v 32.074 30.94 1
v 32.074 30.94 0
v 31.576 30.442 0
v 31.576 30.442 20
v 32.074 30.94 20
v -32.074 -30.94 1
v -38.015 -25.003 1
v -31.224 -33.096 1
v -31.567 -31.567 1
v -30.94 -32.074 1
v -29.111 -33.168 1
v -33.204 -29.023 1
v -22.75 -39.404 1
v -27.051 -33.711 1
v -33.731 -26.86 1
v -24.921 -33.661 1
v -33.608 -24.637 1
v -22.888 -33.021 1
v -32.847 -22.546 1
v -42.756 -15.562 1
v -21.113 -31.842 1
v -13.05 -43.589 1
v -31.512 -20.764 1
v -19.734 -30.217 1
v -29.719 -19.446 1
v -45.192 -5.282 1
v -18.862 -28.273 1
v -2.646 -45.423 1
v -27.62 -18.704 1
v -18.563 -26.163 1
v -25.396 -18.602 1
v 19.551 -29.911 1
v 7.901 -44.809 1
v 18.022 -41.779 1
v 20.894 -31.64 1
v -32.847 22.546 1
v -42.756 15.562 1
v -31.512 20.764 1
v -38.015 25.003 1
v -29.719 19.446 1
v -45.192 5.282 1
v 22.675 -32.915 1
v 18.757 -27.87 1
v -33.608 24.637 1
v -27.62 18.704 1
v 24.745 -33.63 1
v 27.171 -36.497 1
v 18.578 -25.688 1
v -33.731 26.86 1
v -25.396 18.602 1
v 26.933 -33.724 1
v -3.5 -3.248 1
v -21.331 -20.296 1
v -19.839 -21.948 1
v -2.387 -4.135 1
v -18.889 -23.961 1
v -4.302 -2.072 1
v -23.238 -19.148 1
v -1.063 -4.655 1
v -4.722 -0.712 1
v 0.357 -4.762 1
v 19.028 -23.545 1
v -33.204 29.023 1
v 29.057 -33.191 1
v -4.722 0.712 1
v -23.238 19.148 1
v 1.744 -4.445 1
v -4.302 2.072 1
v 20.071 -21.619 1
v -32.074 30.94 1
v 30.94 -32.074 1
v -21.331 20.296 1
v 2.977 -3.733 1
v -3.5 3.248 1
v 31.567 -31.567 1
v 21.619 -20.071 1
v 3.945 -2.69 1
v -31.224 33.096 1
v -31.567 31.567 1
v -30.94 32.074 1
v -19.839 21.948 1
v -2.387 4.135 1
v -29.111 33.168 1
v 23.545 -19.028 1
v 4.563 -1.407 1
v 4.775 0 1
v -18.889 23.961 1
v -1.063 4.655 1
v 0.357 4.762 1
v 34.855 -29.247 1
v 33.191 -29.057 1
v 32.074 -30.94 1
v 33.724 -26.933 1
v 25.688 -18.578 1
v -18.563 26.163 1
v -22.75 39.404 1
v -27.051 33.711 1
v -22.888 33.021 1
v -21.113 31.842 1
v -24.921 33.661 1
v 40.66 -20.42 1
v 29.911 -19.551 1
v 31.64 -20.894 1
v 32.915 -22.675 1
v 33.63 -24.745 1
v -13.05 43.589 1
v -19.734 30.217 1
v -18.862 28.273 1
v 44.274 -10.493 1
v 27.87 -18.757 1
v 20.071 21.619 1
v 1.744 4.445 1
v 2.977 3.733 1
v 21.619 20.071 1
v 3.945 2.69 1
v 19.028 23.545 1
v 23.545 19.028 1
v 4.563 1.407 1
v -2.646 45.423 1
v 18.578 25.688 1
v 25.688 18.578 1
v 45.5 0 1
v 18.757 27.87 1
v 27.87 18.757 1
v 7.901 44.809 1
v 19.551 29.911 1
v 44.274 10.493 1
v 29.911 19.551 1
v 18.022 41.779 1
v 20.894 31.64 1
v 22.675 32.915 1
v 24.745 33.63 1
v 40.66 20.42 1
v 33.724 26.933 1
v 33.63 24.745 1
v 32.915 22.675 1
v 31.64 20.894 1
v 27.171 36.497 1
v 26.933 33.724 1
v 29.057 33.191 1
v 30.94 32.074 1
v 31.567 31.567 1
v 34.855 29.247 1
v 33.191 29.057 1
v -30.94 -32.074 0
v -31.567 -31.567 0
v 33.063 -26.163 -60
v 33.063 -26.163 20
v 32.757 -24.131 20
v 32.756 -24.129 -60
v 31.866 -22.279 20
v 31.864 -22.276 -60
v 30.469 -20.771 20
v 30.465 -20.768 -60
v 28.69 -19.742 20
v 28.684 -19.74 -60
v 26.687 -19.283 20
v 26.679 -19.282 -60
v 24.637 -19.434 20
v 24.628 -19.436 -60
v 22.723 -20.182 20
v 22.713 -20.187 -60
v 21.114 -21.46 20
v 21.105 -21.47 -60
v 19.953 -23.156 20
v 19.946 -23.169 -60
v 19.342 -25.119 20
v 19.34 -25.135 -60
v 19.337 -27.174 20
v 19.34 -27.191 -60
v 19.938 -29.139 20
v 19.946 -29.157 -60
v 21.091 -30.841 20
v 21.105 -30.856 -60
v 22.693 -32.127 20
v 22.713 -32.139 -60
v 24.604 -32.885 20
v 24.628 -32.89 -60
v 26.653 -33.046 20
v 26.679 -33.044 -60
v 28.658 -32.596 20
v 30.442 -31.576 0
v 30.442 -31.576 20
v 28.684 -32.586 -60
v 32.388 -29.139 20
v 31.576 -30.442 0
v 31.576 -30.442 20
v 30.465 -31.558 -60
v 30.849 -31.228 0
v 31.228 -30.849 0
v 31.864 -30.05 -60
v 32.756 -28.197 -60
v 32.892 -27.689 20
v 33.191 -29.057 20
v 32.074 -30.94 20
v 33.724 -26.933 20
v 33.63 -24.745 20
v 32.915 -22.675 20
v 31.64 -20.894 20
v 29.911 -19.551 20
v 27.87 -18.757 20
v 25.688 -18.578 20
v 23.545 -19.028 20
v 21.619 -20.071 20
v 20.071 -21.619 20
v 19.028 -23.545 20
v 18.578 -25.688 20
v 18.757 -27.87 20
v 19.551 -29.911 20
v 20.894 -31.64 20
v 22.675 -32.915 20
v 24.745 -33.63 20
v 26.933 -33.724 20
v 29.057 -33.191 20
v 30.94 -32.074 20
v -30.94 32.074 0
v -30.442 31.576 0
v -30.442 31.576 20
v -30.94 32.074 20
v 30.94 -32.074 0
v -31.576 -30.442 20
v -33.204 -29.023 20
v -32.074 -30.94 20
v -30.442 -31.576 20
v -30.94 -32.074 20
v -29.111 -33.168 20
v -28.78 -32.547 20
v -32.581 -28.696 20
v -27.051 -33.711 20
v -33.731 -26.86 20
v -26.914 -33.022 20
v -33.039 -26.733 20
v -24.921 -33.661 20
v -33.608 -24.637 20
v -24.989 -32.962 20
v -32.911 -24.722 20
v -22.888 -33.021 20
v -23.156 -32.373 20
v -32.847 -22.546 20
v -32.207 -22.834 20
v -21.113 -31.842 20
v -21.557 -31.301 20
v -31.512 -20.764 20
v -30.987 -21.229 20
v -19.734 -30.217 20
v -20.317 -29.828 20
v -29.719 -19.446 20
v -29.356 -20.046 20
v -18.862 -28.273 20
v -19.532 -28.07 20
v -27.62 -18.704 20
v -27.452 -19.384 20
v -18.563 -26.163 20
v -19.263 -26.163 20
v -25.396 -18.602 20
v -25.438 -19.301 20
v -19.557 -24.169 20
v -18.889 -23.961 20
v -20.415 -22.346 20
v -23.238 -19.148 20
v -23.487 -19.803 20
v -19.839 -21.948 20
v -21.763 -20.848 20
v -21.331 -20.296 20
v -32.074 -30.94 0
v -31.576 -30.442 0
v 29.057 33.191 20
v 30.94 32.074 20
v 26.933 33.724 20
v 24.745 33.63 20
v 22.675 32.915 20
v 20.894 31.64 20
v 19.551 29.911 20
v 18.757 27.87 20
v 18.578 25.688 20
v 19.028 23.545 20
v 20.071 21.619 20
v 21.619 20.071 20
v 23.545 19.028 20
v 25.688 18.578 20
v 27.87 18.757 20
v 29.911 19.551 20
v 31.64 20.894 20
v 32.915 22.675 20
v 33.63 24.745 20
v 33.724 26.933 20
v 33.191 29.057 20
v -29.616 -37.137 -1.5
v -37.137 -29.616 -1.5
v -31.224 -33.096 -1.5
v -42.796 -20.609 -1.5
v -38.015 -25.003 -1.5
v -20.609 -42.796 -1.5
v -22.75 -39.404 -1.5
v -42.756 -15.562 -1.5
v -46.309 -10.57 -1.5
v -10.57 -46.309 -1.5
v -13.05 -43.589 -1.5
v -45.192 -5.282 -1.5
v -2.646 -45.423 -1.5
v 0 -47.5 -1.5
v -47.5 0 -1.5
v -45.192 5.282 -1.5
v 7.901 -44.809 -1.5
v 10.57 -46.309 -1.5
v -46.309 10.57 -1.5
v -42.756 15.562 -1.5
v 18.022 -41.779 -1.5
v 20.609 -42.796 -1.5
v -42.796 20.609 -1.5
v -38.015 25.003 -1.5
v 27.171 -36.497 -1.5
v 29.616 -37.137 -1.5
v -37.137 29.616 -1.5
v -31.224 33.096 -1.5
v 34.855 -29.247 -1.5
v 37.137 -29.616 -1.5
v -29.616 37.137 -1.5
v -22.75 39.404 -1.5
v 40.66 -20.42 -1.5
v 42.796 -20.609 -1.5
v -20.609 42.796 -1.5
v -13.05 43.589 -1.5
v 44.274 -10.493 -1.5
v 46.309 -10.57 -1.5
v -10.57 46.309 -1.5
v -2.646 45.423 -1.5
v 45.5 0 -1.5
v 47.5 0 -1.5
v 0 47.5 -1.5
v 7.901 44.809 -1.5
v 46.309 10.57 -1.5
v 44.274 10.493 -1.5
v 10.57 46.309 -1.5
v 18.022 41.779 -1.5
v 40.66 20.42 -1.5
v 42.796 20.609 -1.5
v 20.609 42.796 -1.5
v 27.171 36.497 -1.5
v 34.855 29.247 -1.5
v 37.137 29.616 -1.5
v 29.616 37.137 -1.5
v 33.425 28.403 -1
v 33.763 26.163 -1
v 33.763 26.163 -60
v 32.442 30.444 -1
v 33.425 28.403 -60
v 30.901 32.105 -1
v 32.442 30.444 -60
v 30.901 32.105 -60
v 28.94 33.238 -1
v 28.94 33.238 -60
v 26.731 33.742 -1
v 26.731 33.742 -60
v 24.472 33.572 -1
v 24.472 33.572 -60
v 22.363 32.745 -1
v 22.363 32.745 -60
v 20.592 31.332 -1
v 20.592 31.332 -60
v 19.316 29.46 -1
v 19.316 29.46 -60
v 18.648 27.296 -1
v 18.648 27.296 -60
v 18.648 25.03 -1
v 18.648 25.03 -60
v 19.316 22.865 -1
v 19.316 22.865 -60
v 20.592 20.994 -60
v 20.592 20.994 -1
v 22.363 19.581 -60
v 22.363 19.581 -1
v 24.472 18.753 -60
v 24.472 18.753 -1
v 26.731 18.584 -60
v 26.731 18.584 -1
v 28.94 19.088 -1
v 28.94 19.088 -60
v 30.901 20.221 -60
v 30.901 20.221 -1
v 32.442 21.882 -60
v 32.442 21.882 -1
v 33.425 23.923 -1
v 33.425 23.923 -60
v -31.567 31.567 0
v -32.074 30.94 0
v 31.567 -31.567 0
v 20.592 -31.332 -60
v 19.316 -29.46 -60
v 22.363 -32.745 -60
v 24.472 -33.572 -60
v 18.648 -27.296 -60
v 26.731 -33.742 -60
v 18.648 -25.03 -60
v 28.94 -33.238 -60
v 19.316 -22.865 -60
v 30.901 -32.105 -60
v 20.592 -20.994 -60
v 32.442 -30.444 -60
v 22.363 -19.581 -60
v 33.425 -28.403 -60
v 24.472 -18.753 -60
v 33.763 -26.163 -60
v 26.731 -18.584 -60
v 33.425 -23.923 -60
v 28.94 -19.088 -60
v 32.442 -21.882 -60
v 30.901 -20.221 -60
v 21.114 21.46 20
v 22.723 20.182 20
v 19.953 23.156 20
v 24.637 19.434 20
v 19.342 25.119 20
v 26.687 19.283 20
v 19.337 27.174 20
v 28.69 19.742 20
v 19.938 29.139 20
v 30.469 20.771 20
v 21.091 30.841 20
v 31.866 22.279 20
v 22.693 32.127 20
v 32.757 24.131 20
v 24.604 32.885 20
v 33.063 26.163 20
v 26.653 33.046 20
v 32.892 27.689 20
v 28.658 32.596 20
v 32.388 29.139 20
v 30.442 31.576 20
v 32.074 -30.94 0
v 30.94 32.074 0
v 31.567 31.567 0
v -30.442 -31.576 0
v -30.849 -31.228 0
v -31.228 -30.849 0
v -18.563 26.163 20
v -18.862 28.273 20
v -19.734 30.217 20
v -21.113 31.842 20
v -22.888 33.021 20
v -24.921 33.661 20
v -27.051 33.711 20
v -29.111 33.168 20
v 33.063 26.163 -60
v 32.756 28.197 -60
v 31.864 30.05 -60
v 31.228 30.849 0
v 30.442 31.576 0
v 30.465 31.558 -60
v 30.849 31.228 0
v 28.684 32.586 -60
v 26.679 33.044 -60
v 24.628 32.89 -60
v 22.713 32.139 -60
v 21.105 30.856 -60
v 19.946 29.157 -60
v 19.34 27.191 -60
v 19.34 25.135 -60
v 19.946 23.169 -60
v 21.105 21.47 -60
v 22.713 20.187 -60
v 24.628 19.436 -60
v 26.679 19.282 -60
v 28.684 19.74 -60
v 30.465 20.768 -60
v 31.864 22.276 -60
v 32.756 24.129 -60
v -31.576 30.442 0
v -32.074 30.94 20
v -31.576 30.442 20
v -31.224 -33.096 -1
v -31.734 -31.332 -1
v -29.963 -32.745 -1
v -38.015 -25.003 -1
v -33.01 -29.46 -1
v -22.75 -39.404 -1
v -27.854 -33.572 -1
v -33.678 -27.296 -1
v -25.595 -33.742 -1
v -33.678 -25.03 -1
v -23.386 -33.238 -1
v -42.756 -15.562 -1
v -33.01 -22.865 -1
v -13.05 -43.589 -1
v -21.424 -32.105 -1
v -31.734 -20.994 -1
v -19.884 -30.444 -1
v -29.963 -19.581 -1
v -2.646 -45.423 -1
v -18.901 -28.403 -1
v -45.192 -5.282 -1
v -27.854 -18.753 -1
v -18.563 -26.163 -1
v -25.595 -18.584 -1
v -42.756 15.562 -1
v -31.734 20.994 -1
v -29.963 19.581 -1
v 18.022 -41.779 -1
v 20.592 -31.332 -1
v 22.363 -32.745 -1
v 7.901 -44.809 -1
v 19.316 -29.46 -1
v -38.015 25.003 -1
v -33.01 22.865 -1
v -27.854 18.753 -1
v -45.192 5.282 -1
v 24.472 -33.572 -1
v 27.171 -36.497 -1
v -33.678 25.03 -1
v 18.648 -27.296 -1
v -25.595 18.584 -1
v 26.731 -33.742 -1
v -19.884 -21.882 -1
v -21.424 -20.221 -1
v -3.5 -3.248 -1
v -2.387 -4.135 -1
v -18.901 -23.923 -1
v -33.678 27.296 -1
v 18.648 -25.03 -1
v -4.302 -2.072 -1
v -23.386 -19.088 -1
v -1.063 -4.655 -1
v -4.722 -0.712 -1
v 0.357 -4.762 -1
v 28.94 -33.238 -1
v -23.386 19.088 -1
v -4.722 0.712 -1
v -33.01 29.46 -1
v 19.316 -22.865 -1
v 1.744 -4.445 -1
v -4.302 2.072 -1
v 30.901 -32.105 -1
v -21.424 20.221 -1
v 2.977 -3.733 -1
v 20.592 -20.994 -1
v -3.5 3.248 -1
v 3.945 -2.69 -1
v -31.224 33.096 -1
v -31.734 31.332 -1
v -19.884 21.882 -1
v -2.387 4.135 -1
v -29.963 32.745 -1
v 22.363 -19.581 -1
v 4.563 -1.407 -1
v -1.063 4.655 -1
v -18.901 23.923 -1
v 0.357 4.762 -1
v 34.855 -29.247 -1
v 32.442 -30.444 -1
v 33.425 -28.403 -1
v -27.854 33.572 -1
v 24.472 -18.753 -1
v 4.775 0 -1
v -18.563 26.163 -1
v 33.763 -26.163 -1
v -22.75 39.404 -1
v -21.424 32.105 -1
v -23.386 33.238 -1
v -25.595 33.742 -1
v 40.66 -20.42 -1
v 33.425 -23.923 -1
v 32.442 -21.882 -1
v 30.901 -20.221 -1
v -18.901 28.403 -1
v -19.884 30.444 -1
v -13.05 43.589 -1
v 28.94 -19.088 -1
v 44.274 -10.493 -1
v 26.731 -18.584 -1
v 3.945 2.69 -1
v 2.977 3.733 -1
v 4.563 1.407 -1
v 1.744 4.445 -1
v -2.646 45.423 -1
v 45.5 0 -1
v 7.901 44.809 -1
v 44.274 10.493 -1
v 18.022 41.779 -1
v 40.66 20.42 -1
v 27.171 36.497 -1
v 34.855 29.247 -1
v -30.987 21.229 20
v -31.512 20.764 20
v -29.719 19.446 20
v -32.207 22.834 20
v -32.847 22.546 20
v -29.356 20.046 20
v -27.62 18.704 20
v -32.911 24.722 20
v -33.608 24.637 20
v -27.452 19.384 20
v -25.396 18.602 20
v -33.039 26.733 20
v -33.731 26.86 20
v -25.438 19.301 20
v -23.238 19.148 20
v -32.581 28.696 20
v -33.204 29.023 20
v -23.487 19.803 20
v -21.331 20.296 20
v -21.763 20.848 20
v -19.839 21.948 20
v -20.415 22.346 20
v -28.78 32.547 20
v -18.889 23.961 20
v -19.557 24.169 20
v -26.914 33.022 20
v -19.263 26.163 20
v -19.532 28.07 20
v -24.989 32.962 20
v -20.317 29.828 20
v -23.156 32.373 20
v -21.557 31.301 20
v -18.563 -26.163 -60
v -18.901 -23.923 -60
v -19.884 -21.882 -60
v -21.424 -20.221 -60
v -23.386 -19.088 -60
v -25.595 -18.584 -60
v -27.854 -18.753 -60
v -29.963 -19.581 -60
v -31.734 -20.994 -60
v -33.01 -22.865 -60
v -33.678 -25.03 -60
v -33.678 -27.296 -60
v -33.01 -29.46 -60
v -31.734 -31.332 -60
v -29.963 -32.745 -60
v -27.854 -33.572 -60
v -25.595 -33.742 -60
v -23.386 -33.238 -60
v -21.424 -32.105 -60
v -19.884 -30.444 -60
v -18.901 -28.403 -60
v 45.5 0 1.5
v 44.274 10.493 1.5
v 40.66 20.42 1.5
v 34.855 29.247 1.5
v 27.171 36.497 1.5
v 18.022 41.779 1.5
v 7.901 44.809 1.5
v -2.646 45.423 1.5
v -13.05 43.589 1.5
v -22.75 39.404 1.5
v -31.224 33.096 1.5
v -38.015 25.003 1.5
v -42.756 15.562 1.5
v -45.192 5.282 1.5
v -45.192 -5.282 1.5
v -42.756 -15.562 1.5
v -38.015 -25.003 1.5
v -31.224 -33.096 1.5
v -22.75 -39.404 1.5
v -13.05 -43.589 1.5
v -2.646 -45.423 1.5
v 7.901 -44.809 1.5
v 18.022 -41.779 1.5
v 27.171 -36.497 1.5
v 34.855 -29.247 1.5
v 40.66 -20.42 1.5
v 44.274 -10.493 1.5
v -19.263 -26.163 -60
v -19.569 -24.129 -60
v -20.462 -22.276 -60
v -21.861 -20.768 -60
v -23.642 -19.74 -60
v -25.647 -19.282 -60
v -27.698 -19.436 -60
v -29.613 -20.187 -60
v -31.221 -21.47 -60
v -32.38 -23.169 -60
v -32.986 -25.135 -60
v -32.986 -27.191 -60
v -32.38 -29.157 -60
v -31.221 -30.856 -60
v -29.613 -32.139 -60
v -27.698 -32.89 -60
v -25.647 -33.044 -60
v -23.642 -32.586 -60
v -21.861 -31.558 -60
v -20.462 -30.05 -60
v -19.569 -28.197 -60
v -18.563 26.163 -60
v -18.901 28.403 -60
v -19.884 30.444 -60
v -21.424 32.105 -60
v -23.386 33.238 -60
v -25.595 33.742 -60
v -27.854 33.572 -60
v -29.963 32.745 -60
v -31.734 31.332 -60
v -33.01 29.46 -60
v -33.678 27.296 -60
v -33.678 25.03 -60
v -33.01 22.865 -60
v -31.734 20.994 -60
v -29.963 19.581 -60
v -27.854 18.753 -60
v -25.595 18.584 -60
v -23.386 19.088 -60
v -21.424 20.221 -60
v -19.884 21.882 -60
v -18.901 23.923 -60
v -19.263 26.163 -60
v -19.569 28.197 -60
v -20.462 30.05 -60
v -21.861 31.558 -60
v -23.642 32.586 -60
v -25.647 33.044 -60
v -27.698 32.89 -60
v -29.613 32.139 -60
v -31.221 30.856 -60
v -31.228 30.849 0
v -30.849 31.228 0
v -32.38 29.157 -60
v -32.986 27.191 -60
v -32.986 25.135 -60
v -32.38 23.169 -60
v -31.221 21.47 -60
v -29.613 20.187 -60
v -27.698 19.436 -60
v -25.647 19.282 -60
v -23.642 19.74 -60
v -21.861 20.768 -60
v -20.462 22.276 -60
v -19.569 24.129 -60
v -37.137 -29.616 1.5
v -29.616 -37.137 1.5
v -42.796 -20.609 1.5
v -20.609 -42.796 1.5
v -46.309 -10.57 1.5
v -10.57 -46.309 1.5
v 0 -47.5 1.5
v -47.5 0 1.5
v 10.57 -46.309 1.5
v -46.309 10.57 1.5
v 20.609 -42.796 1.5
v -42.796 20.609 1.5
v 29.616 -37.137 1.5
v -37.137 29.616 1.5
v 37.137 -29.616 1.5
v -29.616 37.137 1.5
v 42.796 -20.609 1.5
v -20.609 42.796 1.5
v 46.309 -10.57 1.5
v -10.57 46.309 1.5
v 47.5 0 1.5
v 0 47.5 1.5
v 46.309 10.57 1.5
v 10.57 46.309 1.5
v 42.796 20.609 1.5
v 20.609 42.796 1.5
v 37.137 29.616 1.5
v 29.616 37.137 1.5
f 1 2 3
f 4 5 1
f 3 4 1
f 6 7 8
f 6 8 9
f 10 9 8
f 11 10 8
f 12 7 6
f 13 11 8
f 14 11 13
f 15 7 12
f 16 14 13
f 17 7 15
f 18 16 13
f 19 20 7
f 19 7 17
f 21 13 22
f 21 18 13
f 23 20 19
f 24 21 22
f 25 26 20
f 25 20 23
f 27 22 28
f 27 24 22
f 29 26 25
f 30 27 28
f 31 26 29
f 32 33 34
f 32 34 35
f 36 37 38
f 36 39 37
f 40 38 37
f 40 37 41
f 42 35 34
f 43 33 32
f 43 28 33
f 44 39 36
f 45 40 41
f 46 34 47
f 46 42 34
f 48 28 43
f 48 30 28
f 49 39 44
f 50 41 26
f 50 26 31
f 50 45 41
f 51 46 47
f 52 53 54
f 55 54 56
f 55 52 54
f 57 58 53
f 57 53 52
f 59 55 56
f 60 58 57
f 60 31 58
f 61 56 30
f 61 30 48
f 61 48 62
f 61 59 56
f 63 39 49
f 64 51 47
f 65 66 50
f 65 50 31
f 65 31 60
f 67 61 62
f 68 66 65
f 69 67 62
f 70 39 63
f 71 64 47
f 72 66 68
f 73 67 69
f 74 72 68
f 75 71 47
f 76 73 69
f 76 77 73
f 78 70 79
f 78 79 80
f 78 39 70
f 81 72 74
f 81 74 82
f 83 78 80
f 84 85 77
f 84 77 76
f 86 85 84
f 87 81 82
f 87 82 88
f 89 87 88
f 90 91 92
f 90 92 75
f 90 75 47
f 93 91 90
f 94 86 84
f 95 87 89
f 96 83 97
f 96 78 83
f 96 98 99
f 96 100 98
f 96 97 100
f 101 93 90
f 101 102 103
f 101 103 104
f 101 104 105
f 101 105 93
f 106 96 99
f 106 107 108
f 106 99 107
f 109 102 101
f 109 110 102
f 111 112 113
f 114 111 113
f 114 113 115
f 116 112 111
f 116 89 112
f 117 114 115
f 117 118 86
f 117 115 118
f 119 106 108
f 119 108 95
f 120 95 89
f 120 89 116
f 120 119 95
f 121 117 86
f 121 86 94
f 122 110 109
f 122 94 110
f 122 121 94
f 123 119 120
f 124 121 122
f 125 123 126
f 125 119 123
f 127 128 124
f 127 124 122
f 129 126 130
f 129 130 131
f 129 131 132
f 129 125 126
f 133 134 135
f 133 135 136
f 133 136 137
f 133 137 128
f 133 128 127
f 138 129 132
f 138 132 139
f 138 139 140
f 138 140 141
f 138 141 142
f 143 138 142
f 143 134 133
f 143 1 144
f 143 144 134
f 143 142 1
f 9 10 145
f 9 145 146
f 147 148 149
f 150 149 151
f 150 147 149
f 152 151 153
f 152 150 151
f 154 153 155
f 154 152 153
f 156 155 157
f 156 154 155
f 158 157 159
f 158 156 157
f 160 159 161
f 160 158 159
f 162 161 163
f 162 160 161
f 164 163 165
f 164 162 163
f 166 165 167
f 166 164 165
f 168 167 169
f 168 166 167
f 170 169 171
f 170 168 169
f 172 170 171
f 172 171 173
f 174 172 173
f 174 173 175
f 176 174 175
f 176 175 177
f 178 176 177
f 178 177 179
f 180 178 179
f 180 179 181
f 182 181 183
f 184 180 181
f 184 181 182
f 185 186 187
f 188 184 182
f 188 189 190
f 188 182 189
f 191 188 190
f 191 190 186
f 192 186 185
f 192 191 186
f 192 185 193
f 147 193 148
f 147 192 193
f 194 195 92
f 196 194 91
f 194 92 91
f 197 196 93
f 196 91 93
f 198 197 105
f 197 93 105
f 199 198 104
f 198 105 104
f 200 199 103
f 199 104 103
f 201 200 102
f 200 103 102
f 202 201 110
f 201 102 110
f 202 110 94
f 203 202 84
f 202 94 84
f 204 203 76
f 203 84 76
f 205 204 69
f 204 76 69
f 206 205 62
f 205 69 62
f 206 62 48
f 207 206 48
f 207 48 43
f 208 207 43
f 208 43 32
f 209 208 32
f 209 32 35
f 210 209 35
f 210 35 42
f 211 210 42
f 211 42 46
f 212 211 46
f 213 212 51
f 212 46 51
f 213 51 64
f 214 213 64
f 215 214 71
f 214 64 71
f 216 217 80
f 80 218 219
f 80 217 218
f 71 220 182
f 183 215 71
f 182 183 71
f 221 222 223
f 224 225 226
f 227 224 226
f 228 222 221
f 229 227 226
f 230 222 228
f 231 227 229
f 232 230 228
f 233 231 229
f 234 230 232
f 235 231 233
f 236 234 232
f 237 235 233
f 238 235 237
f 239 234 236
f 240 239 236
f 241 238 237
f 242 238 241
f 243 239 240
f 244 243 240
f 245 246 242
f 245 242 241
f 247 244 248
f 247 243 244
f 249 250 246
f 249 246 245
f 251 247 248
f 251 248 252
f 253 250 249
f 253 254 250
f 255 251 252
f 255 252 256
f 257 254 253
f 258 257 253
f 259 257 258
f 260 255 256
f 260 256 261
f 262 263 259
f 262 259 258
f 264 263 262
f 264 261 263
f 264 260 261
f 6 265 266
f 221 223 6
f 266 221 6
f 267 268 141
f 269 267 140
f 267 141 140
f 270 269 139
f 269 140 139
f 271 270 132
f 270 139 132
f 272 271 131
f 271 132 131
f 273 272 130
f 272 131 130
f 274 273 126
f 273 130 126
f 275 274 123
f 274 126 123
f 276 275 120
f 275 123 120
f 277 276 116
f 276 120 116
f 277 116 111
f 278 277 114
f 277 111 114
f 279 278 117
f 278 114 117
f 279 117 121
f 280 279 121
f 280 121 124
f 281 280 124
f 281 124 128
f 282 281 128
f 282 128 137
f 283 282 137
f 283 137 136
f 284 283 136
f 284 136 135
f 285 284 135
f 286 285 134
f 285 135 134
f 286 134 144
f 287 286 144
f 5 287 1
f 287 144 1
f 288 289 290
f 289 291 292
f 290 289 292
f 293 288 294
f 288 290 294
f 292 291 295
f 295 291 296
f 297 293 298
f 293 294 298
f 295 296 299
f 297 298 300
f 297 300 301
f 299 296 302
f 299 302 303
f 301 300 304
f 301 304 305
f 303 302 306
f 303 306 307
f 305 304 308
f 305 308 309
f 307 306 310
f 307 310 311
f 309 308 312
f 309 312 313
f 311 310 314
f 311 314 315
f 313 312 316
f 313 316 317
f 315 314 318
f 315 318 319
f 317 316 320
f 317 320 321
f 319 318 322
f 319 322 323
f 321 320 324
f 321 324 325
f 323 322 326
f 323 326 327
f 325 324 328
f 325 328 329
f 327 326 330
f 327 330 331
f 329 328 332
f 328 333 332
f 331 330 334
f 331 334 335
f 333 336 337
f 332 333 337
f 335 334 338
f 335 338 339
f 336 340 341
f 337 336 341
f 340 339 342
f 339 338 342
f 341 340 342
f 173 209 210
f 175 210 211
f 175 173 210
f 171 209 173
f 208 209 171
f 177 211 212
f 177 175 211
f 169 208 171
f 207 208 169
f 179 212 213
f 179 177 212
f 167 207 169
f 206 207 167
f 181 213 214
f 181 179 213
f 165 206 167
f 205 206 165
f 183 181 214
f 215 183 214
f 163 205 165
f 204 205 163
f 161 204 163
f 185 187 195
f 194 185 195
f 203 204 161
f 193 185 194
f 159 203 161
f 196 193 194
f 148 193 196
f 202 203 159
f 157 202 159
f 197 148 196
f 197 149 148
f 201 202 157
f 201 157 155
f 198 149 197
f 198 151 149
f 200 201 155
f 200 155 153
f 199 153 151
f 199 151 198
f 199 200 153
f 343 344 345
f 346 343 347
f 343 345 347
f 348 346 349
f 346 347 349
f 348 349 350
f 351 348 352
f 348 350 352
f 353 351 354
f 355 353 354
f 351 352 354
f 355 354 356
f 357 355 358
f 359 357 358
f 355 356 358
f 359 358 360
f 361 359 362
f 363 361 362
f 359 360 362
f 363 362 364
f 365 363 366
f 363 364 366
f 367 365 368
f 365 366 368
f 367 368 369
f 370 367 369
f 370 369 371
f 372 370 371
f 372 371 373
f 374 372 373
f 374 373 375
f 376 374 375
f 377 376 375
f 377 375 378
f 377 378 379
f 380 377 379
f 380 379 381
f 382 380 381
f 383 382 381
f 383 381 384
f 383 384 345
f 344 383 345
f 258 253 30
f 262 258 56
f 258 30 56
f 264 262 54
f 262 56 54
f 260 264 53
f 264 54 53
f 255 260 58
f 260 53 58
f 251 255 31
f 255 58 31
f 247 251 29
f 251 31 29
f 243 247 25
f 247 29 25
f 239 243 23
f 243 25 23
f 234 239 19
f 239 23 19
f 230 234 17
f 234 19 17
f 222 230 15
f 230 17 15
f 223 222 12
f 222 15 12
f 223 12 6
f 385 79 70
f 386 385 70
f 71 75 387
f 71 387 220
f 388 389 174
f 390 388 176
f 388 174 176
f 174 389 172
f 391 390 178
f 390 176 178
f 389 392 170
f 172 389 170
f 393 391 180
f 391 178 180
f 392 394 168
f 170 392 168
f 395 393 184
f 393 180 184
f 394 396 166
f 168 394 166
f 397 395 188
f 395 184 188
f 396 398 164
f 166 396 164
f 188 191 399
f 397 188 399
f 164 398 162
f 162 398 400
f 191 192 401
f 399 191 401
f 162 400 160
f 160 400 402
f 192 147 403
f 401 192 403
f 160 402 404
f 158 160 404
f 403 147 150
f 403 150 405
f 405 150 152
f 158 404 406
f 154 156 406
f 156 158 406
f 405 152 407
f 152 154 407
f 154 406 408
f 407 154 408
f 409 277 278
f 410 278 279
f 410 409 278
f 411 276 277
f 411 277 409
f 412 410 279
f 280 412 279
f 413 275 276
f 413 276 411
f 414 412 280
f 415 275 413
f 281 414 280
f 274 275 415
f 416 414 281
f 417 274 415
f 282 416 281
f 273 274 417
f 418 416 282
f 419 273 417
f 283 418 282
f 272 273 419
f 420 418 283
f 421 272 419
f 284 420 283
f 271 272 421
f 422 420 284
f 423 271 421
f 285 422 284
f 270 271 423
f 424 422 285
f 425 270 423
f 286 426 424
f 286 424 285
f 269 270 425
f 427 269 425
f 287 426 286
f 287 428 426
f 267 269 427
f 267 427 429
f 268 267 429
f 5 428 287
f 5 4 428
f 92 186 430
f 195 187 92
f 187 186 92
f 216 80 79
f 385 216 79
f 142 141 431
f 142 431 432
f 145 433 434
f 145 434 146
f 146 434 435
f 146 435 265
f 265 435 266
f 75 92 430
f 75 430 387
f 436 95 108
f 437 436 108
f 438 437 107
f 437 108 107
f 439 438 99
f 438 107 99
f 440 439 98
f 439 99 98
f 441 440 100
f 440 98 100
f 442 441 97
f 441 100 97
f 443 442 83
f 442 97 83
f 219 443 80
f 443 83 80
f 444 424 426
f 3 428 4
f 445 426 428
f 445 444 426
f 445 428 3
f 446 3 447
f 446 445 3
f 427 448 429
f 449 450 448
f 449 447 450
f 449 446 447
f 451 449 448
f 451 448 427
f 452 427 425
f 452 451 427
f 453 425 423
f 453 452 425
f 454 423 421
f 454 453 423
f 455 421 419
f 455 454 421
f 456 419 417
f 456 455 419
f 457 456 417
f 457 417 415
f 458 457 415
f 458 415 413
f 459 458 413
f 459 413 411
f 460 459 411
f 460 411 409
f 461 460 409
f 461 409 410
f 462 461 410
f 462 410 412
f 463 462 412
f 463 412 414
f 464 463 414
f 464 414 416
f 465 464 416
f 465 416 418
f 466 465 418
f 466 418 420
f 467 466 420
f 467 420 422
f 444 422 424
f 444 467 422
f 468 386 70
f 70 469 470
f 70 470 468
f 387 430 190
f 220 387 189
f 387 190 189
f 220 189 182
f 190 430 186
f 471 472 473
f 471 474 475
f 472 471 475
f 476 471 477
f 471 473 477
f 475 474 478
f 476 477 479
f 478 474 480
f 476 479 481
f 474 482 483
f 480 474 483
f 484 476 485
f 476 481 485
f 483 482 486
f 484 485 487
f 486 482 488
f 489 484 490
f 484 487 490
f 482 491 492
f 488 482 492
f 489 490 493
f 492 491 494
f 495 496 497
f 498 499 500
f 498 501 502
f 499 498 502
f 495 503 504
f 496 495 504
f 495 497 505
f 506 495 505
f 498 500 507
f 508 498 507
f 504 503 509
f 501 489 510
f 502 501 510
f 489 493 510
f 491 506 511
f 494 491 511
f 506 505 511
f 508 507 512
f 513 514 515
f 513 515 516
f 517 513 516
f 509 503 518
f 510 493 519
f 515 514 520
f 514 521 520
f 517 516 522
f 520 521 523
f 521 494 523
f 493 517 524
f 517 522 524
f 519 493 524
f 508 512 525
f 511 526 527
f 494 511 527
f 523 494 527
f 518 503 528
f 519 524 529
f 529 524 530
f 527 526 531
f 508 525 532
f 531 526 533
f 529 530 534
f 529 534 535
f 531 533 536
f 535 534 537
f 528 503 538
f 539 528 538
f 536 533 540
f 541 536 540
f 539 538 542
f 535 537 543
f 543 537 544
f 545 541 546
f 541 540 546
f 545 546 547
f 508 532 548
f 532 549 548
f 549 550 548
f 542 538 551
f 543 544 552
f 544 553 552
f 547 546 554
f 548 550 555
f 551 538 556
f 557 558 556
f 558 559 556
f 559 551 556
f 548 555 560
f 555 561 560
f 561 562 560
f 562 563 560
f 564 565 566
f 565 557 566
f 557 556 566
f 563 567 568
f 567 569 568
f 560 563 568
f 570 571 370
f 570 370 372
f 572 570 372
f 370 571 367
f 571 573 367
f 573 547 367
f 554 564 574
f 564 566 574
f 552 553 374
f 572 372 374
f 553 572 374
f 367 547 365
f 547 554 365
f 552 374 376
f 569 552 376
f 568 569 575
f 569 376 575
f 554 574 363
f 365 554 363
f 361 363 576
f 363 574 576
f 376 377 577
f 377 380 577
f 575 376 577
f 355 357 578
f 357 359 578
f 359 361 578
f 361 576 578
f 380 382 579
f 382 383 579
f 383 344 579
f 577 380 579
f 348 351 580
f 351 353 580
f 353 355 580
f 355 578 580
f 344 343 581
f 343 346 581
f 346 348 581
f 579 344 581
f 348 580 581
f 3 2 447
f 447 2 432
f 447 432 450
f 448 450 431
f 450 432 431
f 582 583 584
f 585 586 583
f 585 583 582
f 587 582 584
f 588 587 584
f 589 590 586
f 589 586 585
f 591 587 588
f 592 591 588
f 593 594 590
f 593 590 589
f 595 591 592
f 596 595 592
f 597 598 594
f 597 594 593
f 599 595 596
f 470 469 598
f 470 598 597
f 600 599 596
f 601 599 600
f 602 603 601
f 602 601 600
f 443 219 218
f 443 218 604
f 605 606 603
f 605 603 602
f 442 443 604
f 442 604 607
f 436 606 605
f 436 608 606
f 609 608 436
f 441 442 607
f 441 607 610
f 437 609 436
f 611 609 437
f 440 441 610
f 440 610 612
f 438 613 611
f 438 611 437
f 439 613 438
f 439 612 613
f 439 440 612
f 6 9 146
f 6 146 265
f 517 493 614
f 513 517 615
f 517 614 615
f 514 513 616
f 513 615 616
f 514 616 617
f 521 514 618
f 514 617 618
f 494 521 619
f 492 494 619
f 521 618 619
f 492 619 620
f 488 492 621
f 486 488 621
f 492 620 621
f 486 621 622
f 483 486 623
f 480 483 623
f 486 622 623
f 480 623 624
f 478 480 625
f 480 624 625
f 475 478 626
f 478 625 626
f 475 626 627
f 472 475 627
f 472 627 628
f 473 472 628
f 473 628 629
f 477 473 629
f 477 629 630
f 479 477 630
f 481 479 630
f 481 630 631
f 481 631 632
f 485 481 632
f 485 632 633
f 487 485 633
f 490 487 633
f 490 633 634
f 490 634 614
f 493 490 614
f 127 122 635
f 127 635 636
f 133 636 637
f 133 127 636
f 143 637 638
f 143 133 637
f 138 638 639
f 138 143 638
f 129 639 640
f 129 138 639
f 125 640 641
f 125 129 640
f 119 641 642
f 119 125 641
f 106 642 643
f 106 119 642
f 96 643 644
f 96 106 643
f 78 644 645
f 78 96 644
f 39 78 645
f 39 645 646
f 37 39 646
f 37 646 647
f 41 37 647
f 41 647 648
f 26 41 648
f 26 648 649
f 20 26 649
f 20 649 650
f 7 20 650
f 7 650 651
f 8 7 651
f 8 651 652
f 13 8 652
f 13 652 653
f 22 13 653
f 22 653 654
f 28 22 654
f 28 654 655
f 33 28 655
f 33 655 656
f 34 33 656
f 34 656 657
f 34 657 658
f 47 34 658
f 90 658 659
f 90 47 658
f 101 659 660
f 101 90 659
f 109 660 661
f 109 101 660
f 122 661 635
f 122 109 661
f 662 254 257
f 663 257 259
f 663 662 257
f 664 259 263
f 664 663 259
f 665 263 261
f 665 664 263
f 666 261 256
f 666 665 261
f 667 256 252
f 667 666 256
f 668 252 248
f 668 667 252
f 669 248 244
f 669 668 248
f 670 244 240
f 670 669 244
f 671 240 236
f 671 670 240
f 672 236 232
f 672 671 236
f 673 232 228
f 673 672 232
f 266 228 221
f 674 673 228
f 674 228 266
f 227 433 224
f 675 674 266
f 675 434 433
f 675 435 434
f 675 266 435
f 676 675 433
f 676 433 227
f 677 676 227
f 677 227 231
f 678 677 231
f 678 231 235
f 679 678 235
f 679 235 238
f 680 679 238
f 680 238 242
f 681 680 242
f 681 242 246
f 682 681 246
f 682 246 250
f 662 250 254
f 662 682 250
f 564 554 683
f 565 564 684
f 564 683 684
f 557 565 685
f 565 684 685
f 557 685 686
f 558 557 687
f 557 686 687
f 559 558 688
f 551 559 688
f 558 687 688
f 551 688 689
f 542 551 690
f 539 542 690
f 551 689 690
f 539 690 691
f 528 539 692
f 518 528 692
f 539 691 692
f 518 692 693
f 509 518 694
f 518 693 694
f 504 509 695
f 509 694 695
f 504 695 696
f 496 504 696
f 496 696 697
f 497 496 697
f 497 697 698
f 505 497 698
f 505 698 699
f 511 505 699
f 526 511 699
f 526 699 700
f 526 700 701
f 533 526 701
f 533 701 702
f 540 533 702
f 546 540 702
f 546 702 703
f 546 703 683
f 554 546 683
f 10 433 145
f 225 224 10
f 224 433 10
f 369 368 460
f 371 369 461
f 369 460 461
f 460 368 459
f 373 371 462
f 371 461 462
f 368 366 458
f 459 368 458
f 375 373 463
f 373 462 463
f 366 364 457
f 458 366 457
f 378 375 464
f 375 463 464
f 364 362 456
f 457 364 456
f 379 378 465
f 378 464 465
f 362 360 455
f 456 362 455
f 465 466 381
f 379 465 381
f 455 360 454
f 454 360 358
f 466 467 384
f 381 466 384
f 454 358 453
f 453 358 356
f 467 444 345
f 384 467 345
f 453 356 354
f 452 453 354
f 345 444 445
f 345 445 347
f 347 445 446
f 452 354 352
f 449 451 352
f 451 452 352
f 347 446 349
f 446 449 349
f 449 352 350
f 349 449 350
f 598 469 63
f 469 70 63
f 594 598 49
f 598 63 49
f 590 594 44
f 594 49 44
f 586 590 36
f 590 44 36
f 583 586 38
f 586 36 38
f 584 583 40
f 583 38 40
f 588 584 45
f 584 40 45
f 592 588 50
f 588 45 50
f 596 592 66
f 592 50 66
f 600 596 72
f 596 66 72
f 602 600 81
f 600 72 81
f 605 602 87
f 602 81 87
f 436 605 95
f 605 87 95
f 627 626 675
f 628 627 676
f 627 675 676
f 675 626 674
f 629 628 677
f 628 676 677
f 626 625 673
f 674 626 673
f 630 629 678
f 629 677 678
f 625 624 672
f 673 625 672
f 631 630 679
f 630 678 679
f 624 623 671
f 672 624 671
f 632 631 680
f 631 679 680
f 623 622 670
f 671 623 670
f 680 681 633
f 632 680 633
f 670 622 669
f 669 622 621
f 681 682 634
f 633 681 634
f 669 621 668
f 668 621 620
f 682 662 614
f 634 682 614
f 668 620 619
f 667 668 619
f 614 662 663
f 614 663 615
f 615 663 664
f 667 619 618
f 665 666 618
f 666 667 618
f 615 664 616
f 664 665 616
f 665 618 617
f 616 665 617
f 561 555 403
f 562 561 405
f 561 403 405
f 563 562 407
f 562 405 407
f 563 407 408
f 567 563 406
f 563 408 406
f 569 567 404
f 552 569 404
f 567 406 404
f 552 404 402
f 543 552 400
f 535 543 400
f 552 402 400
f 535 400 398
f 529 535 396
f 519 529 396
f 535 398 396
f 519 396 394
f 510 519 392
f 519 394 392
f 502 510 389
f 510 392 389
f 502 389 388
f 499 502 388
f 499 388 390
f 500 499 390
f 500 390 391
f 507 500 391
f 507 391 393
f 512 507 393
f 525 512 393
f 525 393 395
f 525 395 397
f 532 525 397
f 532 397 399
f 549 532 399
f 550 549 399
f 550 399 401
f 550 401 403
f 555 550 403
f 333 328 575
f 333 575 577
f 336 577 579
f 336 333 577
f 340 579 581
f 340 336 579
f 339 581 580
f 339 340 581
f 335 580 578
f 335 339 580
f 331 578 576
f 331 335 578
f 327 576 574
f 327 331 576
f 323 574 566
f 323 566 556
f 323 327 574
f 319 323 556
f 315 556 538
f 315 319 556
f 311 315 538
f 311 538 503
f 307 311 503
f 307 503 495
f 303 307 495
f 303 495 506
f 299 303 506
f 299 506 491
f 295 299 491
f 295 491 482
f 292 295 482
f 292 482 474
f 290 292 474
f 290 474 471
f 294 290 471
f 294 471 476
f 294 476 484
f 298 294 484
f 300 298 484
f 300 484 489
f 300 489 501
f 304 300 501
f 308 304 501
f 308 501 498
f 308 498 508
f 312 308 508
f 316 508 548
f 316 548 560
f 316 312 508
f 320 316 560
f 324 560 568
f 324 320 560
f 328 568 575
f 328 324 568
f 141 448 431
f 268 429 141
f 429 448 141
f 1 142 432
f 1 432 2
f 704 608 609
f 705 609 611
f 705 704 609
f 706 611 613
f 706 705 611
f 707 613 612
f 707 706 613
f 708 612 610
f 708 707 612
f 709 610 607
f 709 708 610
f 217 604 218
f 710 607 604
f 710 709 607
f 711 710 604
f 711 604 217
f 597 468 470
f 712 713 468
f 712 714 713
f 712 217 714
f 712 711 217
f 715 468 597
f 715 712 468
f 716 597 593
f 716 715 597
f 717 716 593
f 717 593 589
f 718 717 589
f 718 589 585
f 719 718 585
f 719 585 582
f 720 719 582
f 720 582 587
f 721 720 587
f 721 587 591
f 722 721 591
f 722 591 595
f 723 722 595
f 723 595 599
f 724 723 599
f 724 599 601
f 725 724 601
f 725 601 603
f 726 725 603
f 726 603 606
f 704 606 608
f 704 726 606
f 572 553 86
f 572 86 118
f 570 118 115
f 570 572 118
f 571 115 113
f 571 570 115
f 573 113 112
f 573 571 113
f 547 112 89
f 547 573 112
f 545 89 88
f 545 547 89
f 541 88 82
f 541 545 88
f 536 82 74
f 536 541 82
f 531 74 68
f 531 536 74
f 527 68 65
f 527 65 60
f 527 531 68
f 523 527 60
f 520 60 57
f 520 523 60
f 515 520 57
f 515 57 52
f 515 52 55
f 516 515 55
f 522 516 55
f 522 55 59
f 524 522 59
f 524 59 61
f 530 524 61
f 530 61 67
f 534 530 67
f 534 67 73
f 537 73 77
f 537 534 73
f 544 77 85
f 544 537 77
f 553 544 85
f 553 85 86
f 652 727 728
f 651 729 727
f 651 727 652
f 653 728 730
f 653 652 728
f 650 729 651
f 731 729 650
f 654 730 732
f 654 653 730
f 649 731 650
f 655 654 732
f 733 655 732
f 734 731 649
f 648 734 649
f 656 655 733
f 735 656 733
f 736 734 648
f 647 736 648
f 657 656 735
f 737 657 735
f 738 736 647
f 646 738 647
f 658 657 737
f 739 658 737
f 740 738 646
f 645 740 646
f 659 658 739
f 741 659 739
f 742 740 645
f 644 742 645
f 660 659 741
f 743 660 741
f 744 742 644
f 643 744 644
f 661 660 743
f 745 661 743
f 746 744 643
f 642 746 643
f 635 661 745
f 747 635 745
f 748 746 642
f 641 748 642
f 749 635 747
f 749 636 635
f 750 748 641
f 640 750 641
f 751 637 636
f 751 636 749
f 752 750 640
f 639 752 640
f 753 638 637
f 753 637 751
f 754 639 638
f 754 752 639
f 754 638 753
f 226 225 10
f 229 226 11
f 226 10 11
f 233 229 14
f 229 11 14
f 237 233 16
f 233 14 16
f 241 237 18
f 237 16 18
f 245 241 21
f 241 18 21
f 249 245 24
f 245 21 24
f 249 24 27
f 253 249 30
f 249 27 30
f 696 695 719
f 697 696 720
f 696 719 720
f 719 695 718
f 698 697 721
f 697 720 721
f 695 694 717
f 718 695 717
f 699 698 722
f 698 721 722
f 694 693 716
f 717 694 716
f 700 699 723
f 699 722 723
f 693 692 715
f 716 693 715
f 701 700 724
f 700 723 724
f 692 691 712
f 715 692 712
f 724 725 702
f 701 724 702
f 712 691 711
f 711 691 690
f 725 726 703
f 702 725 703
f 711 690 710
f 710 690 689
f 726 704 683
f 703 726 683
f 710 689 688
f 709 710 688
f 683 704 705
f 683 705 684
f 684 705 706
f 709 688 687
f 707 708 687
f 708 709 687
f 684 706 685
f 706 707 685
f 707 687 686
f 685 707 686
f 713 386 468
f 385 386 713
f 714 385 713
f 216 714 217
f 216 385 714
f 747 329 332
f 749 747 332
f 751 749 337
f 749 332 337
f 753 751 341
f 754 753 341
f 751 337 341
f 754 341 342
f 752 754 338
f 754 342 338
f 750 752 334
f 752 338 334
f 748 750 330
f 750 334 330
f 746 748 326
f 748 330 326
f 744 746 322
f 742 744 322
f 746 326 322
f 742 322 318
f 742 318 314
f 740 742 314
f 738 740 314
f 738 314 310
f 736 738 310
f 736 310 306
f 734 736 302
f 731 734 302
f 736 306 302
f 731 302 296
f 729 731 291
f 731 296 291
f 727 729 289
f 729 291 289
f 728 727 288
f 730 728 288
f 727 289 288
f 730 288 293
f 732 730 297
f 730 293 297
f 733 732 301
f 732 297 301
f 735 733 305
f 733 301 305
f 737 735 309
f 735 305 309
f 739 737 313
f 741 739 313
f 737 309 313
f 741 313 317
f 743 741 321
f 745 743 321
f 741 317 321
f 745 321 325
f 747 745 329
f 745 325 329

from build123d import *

# Parameters (mm, degrees)
BOSS_EXTRUDE1_DEPTH      = 1
BOSS_EXTRUDE1_DEPTH_BACK = 1
SKETCH1_R                = 45.5
SKETCH1_R_2              = 7.6
SKETCH1_R_3              = 4.774915174
BOSS_EXTRUDE2_DEPTH      = 1.5
BOSS_EXTRUDE2_DEPTH_BACK = 1.5
SKETCH1_3_R              = 47.5
SKETCH1_3_R_2            = 45.5
BOSS_EXTRUDE6_DEPTH      = 20
BOSS_EXTRUDE6_DEPTH_BACK = 60
SKETCH1_6_R              = 7.6
SKETCH1_6_R_2            = 6.9
CUT_EXTRUDE1_DEPTH       = 20


with BuildPart() as part:
    # Sketch1 → Boss-Extrude1 (new, two sides: drawn at the far end of the back side and taken through both)
    with BuildSketch(Plane.XY.offset(-BOSS_EXTRUDE1_DEPTH_BACK)):
        Circle(SKETCH1_R)
        with Locations((-26.162950904, -26.162950904)):
            Circle(SKETCH1_R_2, mode=Mode.SUBTRACT)
        with Locations((26.162950904, -26.162950904)):
            Circle(SKETCH1_R_2, mode=Mode.SUBTRACT)
        with BuildLine():
            ThreePointArc((-29.897696331, 32.781989852), (-22.330462499, 32.725879566), (-18.562950904, 26.162950904))
            ThreePointArc((-18.562950904, 26.162950904), (-18.81283434, 24.230132624), (-19.546052615, 22.424414153))
            ThreePointArc((-19.546052615, 22.424414153), (-20.782603043, 20.795283171), (-22.408811817, 19.554892209))
            ThreePointArc((-22.408811817, 19.554892209), (-31.538501561, 20.790478928), (-32.768857831, 29.920875021))
            ThreePointArc((-32.768857831, 29.920875021), (-31.527535445, 31.546372929), (-29.897696331, 32.781989852))
        make_face(mode=Mode.SUBTRACT)
        Circle(SKETCH1_R_3, mode=Mode.SUBTRACT)
        with Locations((26.162950904, 26.162950904)):
            Circle(SKETCH1_R_2, mode=Mode.SUBTRACT)
    extrude(amount=BOSS_EXTRUDE1_DEPTH + BOSS_EXTRUDE1_DEPTH_BACK)

    # Sketch1<3> → Boss-Extrude2 (add, two sides: drawn at the far end of the back side and taken through both)
    with BuildSketch(Plane.XY.offset(-BOSS_EXTRUDE2_DEPTH_BACK)):
        Circle(SKETCH1_3_R)
        Circle(SKETCH1_3_R_2, mode=Mode.SUBTRACT)
    extrude(amount=BOSS_EXTRUDE2_DEPTH + BOSS_EXTRUDE2_DEPTH_BACK)

    # Sketch1<6> → Boss-Extrude6 (add, two sides: drawn at the far end of the back side and taken through both)
    # profile 1 of 4: a face of its own
    with BuildSketch(Plane.XY.offset(-BOSS_EXTRUDE6_DEPTH_BACK)):
        with Locations((-26.162950904, 26.162950904)):
            Circle(SKETCH1_6_R)
        with Locations((-26.162950904, 26.162950904)):
            Circle(SKETCH1_6_R_2, mode=Mode.SUBTRACT)
    # profile 2 of 4: a face of its own
    with BuildSketch(Plane.XY.offset(-BOSS_EXTRUDE6_DEPTH_BACK)):
        with Locations((26.162950904, 26.162950904)):
            Circle(SKETCH1_6_R)
        with Locations((26.162950904, 26.162950904)):
            Circle(SKETCH1_6_R_2, mode=Mode.SUBTRACT)
    # profile 3 of 4: a face of its own
    with BuildSketch(Plane.XY.offset(-BOSS_EXTRUDE6_DEPTH_BACK)):
        with Locations((26.162950904, -26.162950904)):
            Circle(SKETCH1_6_R)
        with Locations((26.162950904, -26.162950904)):
            Circle(SKETCH1_6_R_2, mode=Mode.SUBTRACT)
    # profile 4 of 4: a face of its own
    with BuildSketch(Plane.XY.offset(-BOSS_EXTRUDE6_DEPTH_BACK)):
        with Locations((-26.162950904, -26.162950904)):
            Circle(SKETCH1_6_R)
        with Locations((-26.162950904, -26.162950904)):
            Circle(SKETCH1_6_R_2, mode=Mode.SUBTRACT)
    extrude(amount=BOSS_EXTRUDE6_DEPTH + BOSS_EXTRUDE6_DEPTH_BACK)

    # Sketch2 → Cut-Extrude1 (cut)
    with BuildSketch(Plane.XY.offset(20)):
        Polygon((-31.533797235, 30.40024079), (-30.40024079, 31.533797235), (-30.940212581, 32.073769026), (-31.567102172, 31.567102172), (-32.073769026, 30.940212581), align=None)
        Polygon((31.533797235, 30.40024079), (32.073769026, 30.940212581), (31.567102172, 31.567102172), (30.940212581, 32.073769026), (30.40024079, 31.533797235), align=None)
        Polygon((30.40024079, -31.533797235), (30.940212581, -32.073769026), (31.567102172, -31.567102172), (32.073769026, -30.940212581), (31.533797235, -30.40024079), align=None)
        Polygon((-31.533797235, -30.40024079), (-32.073769026, -30.940212581), (-31.567102172, -31.567102172), (-30.940212581, -32.073769026), (-30.40024079, -31.533797235), align=None)
    extrude(amount=-CUT_EXTRUDE1_DEPTH, mode=Mode.SUBTRACT)


solid = part.part
